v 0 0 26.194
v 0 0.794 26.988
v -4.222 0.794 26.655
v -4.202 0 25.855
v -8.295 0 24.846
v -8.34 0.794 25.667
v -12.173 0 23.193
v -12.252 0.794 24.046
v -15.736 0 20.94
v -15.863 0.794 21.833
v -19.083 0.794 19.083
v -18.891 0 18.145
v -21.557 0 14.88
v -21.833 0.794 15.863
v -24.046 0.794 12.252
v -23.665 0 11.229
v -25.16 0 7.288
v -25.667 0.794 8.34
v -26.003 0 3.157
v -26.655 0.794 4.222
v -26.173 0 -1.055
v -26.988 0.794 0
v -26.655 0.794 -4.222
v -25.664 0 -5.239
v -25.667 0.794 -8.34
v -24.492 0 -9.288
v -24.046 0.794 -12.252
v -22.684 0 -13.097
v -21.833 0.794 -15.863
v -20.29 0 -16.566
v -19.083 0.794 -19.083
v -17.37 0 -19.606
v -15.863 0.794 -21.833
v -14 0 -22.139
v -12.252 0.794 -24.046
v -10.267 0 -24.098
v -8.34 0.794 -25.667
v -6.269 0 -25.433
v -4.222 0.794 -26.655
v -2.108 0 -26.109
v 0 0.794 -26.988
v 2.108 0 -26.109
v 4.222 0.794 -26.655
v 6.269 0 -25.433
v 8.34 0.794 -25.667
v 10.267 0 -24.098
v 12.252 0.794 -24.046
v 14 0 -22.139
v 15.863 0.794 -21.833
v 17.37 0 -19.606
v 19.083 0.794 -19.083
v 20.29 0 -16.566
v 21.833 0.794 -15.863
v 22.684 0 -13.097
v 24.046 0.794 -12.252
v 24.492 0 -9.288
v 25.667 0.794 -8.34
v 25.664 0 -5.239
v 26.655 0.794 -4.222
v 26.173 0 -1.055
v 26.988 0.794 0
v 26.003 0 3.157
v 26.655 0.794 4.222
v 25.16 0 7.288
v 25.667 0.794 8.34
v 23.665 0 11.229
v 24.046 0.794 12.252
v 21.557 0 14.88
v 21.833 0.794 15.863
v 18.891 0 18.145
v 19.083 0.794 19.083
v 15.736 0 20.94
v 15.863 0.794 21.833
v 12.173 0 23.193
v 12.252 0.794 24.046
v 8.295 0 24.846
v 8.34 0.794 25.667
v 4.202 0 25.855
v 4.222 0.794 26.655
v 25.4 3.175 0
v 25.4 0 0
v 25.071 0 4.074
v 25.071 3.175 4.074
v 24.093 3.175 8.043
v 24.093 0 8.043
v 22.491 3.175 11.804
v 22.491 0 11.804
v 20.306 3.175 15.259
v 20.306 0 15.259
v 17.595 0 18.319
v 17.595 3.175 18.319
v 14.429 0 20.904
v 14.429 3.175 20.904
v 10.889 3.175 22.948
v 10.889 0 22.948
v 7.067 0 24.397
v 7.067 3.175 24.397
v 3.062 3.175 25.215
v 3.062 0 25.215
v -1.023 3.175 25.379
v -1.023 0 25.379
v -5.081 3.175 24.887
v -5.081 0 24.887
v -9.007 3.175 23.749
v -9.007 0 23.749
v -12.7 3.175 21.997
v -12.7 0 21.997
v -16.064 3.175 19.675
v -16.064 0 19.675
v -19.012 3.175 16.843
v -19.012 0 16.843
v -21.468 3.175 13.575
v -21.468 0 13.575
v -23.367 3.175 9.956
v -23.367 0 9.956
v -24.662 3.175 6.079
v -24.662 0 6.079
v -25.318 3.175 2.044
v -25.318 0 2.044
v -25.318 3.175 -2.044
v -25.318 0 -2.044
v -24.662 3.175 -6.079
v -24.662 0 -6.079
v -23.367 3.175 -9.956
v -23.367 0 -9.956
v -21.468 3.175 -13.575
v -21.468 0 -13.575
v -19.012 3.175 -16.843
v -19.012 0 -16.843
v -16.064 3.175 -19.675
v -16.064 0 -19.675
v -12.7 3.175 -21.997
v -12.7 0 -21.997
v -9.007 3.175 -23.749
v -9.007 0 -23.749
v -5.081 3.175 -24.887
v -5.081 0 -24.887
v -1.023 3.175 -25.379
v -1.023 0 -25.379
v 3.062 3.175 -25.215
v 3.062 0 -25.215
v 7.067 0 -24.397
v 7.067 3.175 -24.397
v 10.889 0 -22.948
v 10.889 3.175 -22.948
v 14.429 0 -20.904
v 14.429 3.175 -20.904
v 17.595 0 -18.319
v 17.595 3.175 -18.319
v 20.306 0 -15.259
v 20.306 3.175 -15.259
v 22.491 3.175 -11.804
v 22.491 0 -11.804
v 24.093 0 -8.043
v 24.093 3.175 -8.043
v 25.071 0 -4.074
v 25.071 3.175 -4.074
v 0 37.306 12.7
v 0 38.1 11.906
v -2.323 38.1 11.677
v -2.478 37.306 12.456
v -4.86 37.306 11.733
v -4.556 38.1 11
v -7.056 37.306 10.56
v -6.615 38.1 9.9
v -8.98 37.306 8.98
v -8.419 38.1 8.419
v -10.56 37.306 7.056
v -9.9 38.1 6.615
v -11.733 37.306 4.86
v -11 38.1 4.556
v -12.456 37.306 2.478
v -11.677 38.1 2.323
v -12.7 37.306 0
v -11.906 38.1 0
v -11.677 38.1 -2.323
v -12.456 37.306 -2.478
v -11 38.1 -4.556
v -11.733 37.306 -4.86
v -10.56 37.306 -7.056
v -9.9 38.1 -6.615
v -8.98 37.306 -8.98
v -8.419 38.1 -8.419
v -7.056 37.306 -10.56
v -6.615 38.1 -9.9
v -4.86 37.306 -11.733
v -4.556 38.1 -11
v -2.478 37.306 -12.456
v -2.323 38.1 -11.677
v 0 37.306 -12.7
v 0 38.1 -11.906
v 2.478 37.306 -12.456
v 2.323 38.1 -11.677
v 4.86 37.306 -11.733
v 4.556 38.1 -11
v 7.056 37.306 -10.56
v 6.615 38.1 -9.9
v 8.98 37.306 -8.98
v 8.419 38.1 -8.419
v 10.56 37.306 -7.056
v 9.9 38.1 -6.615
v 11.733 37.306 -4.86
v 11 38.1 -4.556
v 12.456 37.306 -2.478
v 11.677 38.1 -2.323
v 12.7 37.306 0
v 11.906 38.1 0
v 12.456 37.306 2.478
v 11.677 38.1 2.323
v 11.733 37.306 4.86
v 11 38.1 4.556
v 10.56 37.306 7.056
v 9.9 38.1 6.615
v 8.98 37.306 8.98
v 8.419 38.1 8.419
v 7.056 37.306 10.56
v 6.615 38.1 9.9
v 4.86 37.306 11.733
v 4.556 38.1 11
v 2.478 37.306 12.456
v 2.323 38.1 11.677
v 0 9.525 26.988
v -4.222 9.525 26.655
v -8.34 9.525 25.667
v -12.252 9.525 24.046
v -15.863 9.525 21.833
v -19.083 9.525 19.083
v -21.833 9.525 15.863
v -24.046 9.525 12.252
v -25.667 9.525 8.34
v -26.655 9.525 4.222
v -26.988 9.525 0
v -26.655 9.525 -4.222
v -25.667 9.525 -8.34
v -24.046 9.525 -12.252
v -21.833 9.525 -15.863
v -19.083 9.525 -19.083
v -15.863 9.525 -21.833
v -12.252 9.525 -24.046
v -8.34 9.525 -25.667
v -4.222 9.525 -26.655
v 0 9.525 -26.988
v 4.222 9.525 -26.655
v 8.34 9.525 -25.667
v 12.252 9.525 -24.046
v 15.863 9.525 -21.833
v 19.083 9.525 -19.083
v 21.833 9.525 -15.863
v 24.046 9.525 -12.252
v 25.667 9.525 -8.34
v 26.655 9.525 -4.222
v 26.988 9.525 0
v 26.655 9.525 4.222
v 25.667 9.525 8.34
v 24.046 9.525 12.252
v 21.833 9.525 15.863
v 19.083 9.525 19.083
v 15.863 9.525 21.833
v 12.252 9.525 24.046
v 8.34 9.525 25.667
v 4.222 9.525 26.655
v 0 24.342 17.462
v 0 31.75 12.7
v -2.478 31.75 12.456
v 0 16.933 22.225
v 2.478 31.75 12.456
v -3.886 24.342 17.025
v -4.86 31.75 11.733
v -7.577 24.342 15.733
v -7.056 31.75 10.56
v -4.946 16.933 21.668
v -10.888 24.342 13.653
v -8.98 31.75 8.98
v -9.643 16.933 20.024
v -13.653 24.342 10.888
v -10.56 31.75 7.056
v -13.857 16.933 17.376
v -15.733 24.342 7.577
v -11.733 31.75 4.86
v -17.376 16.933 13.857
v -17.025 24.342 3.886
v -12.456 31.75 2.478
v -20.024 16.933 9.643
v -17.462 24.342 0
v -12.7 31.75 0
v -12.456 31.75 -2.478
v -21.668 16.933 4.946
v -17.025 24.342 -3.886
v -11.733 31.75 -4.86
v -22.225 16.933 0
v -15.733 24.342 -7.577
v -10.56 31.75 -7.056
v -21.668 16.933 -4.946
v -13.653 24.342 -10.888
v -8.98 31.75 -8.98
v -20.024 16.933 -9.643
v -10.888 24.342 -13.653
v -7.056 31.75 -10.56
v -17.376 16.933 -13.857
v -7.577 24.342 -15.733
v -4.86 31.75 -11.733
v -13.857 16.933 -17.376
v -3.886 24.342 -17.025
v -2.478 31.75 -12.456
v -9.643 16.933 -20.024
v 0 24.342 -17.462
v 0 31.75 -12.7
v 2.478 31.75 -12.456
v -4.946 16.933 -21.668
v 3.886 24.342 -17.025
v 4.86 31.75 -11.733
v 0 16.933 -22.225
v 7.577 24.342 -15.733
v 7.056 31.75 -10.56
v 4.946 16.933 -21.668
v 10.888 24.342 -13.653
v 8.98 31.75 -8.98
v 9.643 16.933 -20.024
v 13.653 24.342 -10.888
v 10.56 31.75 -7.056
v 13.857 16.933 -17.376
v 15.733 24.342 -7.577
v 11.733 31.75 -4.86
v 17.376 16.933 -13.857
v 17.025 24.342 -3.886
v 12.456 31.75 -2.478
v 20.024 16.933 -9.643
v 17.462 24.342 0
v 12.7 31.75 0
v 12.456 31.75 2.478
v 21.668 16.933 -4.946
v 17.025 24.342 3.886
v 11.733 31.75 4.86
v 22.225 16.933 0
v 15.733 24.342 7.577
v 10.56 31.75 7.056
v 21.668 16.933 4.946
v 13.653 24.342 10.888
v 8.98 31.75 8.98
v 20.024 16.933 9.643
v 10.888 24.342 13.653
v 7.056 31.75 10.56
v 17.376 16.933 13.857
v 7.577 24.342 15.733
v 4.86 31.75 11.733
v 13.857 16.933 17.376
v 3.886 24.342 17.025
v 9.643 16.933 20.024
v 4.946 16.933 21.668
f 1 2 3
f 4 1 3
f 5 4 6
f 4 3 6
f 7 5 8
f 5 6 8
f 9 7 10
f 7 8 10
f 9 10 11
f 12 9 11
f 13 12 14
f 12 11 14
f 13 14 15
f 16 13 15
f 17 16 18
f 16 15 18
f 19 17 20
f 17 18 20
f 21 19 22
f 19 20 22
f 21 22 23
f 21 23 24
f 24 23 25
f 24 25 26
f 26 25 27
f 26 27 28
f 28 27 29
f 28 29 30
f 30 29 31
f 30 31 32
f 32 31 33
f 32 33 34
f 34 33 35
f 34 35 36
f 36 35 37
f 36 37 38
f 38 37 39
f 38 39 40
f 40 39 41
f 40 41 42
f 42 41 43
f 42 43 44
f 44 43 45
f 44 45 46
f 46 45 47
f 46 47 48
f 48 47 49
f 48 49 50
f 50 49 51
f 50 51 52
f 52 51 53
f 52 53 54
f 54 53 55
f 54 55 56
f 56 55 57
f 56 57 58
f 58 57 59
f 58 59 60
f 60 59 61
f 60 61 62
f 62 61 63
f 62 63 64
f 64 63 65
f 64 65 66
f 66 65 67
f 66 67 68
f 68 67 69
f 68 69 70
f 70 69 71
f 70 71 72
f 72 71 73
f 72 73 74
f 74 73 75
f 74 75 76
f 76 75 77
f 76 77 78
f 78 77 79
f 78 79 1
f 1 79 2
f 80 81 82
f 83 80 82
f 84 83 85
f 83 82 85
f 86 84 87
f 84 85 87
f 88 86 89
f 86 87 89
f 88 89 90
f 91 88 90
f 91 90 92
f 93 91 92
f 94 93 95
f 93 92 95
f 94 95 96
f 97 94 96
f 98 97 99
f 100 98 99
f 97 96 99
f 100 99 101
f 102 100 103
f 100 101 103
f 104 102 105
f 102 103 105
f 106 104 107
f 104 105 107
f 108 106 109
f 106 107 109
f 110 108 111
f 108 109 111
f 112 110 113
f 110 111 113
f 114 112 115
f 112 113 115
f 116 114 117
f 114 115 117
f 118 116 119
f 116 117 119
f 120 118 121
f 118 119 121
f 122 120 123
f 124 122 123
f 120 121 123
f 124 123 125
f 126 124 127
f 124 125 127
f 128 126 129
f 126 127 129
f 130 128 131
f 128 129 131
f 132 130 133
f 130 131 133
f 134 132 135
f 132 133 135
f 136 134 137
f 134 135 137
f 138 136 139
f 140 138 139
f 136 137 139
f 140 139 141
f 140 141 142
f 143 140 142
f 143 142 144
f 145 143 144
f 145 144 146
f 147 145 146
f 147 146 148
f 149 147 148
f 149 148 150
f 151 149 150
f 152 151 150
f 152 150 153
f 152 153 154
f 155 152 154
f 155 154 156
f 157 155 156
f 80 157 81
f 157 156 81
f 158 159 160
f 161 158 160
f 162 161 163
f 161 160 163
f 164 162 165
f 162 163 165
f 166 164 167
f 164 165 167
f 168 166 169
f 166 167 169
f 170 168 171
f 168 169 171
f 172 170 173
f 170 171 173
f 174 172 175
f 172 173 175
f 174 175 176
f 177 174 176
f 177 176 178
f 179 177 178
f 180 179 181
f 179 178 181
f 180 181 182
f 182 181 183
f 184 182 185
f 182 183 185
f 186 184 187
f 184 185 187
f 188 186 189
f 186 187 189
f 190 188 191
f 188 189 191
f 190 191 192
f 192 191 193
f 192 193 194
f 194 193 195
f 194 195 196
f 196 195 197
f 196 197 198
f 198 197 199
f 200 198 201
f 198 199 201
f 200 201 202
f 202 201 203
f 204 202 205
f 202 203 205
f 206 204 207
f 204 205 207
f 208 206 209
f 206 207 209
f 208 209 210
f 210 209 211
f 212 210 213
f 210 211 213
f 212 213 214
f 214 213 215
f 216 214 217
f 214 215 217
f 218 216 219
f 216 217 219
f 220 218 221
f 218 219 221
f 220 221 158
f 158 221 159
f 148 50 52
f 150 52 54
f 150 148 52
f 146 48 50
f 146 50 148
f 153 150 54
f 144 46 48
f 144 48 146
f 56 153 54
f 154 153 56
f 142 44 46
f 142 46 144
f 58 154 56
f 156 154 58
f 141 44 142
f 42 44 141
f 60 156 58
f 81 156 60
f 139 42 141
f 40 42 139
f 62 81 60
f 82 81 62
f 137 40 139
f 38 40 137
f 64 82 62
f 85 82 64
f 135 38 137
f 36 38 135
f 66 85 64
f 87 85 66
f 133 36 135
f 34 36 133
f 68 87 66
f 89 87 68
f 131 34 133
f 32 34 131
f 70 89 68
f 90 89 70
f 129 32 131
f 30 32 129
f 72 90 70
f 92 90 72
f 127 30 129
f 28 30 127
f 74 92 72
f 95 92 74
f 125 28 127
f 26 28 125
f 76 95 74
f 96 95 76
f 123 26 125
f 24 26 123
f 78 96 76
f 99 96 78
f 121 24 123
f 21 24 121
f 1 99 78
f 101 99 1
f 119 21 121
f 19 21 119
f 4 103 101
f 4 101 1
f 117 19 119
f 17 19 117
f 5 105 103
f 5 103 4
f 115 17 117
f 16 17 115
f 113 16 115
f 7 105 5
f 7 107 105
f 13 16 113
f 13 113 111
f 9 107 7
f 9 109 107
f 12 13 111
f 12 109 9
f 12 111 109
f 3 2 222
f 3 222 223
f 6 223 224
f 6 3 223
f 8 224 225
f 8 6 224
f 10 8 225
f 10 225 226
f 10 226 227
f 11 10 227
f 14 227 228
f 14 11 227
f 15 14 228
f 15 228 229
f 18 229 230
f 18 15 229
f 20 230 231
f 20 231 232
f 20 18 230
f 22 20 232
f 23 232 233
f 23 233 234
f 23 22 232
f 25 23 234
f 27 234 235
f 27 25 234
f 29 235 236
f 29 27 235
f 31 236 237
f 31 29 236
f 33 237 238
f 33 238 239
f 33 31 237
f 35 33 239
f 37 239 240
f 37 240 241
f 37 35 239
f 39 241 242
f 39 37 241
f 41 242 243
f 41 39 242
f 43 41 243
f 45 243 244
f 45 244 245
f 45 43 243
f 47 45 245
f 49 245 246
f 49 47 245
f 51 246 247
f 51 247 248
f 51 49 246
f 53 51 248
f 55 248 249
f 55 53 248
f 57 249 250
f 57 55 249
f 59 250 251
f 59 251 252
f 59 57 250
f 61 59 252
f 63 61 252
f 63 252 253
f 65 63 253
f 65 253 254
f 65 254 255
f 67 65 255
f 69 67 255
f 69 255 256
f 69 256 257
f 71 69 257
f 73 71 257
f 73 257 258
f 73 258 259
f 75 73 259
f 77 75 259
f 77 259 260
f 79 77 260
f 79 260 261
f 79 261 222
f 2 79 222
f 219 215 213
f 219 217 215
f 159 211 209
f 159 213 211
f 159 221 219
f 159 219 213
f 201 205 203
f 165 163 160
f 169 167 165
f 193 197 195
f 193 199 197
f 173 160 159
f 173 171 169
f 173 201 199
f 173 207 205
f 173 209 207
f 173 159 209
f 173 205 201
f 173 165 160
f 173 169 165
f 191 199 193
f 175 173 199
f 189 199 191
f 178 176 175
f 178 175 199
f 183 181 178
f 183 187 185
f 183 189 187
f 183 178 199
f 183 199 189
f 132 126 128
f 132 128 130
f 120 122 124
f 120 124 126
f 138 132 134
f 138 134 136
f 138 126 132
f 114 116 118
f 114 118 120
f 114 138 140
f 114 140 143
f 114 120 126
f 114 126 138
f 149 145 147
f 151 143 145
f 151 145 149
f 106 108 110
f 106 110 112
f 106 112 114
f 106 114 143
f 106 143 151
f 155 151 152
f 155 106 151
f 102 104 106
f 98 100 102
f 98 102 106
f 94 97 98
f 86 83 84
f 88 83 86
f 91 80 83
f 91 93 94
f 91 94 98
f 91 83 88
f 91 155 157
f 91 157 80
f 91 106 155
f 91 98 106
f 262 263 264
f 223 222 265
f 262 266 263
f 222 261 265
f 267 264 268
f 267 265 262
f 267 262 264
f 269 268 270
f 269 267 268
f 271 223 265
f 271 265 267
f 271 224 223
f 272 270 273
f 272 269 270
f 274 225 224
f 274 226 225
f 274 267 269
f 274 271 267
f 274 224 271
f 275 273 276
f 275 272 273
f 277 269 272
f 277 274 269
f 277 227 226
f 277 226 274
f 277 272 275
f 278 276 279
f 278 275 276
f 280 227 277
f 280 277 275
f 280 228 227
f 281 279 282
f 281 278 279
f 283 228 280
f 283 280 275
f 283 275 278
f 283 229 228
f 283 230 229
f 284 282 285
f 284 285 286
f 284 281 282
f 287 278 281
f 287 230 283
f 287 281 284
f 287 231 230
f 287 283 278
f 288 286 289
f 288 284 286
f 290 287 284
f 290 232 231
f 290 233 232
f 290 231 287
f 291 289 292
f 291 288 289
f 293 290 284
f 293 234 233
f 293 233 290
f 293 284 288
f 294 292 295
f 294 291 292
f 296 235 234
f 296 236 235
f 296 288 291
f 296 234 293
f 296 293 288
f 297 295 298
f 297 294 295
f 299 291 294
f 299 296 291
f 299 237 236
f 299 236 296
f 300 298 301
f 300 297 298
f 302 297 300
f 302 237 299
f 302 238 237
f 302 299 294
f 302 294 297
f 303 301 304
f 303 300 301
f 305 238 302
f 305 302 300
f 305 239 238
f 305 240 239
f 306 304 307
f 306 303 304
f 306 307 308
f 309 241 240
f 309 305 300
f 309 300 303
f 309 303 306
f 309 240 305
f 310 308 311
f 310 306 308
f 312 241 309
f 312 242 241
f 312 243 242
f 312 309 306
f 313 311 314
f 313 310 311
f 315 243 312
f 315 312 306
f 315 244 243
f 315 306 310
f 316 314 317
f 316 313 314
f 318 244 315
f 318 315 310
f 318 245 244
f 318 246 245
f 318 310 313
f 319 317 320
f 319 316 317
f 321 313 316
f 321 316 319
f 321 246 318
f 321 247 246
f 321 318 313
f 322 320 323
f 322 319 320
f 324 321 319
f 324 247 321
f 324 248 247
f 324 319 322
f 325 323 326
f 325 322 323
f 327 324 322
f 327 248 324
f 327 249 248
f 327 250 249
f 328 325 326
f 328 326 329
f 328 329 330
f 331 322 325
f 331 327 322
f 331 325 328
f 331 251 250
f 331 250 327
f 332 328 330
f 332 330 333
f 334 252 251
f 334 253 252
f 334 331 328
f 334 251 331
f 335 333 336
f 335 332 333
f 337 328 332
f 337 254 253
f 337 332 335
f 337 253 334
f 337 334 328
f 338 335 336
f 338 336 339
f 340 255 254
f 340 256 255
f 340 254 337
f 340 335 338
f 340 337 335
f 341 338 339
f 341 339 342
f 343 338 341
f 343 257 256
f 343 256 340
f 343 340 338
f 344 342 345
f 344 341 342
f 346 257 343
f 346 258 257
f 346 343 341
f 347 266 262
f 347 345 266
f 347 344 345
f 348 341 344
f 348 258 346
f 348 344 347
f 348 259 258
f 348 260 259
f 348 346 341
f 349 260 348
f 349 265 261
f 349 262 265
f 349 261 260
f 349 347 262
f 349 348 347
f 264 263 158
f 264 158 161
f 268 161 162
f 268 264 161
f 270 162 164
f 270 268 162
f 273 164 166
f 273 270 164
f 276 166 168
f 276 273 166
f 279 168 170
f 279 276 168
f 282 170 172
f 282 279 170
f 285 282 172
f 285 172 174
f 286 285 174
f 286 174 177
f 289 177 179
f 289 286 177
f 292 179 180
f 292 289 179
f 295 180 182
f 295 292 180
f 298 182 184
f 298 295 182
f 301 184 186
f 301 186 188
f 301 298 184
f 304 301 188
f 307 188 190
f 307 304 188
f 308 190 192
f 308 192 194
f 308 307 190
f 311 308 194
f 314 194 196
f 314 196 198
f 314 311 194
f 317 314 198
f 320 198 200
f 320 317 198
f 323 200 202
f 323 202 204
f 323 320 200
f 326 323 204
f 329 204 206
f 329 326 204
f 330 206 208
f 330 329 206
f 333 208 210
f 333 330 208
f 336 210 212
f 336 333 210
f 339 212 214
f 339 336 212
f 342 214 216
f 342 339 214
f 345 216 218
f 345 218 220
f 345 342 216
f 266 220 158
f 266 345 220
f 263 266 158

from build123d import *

# Parameters (mm, degrees)
F2_R     = 25.4
F3_DEPTH = 3.175
F4_SIZE  = 0.79375


with BuildPart() as f1:
    # F0 (on Right) → F1 (revolve)
    with BuildSketch(Plane.YZ):
        Polygon((0, 26.9875), (0, 0), (38.1, 0), (38.1, 12.7), (31.75, 12.7), (9.525, 26.9875), align=None)
    revolve(axis=Axis((0, 19.05, 0), (0, -1, 0)))

    # F2 (on face) → F3 (cut)
    with BuildSketch(Plane.XZ):
        Circle(F2_R)
    extrude(amount=-F3_DEPTH, mode=Mode.SUBTRACT)

    # F4
    f4_edges = [f1.edges().sort_by_distance(p)[0] for p in [
        (0, 0, -26.9875),
        (0, 38.1, -12.7),
    ]]
    chamfer(f4_edges, length=F4_SIZE)


solid = f1.part
